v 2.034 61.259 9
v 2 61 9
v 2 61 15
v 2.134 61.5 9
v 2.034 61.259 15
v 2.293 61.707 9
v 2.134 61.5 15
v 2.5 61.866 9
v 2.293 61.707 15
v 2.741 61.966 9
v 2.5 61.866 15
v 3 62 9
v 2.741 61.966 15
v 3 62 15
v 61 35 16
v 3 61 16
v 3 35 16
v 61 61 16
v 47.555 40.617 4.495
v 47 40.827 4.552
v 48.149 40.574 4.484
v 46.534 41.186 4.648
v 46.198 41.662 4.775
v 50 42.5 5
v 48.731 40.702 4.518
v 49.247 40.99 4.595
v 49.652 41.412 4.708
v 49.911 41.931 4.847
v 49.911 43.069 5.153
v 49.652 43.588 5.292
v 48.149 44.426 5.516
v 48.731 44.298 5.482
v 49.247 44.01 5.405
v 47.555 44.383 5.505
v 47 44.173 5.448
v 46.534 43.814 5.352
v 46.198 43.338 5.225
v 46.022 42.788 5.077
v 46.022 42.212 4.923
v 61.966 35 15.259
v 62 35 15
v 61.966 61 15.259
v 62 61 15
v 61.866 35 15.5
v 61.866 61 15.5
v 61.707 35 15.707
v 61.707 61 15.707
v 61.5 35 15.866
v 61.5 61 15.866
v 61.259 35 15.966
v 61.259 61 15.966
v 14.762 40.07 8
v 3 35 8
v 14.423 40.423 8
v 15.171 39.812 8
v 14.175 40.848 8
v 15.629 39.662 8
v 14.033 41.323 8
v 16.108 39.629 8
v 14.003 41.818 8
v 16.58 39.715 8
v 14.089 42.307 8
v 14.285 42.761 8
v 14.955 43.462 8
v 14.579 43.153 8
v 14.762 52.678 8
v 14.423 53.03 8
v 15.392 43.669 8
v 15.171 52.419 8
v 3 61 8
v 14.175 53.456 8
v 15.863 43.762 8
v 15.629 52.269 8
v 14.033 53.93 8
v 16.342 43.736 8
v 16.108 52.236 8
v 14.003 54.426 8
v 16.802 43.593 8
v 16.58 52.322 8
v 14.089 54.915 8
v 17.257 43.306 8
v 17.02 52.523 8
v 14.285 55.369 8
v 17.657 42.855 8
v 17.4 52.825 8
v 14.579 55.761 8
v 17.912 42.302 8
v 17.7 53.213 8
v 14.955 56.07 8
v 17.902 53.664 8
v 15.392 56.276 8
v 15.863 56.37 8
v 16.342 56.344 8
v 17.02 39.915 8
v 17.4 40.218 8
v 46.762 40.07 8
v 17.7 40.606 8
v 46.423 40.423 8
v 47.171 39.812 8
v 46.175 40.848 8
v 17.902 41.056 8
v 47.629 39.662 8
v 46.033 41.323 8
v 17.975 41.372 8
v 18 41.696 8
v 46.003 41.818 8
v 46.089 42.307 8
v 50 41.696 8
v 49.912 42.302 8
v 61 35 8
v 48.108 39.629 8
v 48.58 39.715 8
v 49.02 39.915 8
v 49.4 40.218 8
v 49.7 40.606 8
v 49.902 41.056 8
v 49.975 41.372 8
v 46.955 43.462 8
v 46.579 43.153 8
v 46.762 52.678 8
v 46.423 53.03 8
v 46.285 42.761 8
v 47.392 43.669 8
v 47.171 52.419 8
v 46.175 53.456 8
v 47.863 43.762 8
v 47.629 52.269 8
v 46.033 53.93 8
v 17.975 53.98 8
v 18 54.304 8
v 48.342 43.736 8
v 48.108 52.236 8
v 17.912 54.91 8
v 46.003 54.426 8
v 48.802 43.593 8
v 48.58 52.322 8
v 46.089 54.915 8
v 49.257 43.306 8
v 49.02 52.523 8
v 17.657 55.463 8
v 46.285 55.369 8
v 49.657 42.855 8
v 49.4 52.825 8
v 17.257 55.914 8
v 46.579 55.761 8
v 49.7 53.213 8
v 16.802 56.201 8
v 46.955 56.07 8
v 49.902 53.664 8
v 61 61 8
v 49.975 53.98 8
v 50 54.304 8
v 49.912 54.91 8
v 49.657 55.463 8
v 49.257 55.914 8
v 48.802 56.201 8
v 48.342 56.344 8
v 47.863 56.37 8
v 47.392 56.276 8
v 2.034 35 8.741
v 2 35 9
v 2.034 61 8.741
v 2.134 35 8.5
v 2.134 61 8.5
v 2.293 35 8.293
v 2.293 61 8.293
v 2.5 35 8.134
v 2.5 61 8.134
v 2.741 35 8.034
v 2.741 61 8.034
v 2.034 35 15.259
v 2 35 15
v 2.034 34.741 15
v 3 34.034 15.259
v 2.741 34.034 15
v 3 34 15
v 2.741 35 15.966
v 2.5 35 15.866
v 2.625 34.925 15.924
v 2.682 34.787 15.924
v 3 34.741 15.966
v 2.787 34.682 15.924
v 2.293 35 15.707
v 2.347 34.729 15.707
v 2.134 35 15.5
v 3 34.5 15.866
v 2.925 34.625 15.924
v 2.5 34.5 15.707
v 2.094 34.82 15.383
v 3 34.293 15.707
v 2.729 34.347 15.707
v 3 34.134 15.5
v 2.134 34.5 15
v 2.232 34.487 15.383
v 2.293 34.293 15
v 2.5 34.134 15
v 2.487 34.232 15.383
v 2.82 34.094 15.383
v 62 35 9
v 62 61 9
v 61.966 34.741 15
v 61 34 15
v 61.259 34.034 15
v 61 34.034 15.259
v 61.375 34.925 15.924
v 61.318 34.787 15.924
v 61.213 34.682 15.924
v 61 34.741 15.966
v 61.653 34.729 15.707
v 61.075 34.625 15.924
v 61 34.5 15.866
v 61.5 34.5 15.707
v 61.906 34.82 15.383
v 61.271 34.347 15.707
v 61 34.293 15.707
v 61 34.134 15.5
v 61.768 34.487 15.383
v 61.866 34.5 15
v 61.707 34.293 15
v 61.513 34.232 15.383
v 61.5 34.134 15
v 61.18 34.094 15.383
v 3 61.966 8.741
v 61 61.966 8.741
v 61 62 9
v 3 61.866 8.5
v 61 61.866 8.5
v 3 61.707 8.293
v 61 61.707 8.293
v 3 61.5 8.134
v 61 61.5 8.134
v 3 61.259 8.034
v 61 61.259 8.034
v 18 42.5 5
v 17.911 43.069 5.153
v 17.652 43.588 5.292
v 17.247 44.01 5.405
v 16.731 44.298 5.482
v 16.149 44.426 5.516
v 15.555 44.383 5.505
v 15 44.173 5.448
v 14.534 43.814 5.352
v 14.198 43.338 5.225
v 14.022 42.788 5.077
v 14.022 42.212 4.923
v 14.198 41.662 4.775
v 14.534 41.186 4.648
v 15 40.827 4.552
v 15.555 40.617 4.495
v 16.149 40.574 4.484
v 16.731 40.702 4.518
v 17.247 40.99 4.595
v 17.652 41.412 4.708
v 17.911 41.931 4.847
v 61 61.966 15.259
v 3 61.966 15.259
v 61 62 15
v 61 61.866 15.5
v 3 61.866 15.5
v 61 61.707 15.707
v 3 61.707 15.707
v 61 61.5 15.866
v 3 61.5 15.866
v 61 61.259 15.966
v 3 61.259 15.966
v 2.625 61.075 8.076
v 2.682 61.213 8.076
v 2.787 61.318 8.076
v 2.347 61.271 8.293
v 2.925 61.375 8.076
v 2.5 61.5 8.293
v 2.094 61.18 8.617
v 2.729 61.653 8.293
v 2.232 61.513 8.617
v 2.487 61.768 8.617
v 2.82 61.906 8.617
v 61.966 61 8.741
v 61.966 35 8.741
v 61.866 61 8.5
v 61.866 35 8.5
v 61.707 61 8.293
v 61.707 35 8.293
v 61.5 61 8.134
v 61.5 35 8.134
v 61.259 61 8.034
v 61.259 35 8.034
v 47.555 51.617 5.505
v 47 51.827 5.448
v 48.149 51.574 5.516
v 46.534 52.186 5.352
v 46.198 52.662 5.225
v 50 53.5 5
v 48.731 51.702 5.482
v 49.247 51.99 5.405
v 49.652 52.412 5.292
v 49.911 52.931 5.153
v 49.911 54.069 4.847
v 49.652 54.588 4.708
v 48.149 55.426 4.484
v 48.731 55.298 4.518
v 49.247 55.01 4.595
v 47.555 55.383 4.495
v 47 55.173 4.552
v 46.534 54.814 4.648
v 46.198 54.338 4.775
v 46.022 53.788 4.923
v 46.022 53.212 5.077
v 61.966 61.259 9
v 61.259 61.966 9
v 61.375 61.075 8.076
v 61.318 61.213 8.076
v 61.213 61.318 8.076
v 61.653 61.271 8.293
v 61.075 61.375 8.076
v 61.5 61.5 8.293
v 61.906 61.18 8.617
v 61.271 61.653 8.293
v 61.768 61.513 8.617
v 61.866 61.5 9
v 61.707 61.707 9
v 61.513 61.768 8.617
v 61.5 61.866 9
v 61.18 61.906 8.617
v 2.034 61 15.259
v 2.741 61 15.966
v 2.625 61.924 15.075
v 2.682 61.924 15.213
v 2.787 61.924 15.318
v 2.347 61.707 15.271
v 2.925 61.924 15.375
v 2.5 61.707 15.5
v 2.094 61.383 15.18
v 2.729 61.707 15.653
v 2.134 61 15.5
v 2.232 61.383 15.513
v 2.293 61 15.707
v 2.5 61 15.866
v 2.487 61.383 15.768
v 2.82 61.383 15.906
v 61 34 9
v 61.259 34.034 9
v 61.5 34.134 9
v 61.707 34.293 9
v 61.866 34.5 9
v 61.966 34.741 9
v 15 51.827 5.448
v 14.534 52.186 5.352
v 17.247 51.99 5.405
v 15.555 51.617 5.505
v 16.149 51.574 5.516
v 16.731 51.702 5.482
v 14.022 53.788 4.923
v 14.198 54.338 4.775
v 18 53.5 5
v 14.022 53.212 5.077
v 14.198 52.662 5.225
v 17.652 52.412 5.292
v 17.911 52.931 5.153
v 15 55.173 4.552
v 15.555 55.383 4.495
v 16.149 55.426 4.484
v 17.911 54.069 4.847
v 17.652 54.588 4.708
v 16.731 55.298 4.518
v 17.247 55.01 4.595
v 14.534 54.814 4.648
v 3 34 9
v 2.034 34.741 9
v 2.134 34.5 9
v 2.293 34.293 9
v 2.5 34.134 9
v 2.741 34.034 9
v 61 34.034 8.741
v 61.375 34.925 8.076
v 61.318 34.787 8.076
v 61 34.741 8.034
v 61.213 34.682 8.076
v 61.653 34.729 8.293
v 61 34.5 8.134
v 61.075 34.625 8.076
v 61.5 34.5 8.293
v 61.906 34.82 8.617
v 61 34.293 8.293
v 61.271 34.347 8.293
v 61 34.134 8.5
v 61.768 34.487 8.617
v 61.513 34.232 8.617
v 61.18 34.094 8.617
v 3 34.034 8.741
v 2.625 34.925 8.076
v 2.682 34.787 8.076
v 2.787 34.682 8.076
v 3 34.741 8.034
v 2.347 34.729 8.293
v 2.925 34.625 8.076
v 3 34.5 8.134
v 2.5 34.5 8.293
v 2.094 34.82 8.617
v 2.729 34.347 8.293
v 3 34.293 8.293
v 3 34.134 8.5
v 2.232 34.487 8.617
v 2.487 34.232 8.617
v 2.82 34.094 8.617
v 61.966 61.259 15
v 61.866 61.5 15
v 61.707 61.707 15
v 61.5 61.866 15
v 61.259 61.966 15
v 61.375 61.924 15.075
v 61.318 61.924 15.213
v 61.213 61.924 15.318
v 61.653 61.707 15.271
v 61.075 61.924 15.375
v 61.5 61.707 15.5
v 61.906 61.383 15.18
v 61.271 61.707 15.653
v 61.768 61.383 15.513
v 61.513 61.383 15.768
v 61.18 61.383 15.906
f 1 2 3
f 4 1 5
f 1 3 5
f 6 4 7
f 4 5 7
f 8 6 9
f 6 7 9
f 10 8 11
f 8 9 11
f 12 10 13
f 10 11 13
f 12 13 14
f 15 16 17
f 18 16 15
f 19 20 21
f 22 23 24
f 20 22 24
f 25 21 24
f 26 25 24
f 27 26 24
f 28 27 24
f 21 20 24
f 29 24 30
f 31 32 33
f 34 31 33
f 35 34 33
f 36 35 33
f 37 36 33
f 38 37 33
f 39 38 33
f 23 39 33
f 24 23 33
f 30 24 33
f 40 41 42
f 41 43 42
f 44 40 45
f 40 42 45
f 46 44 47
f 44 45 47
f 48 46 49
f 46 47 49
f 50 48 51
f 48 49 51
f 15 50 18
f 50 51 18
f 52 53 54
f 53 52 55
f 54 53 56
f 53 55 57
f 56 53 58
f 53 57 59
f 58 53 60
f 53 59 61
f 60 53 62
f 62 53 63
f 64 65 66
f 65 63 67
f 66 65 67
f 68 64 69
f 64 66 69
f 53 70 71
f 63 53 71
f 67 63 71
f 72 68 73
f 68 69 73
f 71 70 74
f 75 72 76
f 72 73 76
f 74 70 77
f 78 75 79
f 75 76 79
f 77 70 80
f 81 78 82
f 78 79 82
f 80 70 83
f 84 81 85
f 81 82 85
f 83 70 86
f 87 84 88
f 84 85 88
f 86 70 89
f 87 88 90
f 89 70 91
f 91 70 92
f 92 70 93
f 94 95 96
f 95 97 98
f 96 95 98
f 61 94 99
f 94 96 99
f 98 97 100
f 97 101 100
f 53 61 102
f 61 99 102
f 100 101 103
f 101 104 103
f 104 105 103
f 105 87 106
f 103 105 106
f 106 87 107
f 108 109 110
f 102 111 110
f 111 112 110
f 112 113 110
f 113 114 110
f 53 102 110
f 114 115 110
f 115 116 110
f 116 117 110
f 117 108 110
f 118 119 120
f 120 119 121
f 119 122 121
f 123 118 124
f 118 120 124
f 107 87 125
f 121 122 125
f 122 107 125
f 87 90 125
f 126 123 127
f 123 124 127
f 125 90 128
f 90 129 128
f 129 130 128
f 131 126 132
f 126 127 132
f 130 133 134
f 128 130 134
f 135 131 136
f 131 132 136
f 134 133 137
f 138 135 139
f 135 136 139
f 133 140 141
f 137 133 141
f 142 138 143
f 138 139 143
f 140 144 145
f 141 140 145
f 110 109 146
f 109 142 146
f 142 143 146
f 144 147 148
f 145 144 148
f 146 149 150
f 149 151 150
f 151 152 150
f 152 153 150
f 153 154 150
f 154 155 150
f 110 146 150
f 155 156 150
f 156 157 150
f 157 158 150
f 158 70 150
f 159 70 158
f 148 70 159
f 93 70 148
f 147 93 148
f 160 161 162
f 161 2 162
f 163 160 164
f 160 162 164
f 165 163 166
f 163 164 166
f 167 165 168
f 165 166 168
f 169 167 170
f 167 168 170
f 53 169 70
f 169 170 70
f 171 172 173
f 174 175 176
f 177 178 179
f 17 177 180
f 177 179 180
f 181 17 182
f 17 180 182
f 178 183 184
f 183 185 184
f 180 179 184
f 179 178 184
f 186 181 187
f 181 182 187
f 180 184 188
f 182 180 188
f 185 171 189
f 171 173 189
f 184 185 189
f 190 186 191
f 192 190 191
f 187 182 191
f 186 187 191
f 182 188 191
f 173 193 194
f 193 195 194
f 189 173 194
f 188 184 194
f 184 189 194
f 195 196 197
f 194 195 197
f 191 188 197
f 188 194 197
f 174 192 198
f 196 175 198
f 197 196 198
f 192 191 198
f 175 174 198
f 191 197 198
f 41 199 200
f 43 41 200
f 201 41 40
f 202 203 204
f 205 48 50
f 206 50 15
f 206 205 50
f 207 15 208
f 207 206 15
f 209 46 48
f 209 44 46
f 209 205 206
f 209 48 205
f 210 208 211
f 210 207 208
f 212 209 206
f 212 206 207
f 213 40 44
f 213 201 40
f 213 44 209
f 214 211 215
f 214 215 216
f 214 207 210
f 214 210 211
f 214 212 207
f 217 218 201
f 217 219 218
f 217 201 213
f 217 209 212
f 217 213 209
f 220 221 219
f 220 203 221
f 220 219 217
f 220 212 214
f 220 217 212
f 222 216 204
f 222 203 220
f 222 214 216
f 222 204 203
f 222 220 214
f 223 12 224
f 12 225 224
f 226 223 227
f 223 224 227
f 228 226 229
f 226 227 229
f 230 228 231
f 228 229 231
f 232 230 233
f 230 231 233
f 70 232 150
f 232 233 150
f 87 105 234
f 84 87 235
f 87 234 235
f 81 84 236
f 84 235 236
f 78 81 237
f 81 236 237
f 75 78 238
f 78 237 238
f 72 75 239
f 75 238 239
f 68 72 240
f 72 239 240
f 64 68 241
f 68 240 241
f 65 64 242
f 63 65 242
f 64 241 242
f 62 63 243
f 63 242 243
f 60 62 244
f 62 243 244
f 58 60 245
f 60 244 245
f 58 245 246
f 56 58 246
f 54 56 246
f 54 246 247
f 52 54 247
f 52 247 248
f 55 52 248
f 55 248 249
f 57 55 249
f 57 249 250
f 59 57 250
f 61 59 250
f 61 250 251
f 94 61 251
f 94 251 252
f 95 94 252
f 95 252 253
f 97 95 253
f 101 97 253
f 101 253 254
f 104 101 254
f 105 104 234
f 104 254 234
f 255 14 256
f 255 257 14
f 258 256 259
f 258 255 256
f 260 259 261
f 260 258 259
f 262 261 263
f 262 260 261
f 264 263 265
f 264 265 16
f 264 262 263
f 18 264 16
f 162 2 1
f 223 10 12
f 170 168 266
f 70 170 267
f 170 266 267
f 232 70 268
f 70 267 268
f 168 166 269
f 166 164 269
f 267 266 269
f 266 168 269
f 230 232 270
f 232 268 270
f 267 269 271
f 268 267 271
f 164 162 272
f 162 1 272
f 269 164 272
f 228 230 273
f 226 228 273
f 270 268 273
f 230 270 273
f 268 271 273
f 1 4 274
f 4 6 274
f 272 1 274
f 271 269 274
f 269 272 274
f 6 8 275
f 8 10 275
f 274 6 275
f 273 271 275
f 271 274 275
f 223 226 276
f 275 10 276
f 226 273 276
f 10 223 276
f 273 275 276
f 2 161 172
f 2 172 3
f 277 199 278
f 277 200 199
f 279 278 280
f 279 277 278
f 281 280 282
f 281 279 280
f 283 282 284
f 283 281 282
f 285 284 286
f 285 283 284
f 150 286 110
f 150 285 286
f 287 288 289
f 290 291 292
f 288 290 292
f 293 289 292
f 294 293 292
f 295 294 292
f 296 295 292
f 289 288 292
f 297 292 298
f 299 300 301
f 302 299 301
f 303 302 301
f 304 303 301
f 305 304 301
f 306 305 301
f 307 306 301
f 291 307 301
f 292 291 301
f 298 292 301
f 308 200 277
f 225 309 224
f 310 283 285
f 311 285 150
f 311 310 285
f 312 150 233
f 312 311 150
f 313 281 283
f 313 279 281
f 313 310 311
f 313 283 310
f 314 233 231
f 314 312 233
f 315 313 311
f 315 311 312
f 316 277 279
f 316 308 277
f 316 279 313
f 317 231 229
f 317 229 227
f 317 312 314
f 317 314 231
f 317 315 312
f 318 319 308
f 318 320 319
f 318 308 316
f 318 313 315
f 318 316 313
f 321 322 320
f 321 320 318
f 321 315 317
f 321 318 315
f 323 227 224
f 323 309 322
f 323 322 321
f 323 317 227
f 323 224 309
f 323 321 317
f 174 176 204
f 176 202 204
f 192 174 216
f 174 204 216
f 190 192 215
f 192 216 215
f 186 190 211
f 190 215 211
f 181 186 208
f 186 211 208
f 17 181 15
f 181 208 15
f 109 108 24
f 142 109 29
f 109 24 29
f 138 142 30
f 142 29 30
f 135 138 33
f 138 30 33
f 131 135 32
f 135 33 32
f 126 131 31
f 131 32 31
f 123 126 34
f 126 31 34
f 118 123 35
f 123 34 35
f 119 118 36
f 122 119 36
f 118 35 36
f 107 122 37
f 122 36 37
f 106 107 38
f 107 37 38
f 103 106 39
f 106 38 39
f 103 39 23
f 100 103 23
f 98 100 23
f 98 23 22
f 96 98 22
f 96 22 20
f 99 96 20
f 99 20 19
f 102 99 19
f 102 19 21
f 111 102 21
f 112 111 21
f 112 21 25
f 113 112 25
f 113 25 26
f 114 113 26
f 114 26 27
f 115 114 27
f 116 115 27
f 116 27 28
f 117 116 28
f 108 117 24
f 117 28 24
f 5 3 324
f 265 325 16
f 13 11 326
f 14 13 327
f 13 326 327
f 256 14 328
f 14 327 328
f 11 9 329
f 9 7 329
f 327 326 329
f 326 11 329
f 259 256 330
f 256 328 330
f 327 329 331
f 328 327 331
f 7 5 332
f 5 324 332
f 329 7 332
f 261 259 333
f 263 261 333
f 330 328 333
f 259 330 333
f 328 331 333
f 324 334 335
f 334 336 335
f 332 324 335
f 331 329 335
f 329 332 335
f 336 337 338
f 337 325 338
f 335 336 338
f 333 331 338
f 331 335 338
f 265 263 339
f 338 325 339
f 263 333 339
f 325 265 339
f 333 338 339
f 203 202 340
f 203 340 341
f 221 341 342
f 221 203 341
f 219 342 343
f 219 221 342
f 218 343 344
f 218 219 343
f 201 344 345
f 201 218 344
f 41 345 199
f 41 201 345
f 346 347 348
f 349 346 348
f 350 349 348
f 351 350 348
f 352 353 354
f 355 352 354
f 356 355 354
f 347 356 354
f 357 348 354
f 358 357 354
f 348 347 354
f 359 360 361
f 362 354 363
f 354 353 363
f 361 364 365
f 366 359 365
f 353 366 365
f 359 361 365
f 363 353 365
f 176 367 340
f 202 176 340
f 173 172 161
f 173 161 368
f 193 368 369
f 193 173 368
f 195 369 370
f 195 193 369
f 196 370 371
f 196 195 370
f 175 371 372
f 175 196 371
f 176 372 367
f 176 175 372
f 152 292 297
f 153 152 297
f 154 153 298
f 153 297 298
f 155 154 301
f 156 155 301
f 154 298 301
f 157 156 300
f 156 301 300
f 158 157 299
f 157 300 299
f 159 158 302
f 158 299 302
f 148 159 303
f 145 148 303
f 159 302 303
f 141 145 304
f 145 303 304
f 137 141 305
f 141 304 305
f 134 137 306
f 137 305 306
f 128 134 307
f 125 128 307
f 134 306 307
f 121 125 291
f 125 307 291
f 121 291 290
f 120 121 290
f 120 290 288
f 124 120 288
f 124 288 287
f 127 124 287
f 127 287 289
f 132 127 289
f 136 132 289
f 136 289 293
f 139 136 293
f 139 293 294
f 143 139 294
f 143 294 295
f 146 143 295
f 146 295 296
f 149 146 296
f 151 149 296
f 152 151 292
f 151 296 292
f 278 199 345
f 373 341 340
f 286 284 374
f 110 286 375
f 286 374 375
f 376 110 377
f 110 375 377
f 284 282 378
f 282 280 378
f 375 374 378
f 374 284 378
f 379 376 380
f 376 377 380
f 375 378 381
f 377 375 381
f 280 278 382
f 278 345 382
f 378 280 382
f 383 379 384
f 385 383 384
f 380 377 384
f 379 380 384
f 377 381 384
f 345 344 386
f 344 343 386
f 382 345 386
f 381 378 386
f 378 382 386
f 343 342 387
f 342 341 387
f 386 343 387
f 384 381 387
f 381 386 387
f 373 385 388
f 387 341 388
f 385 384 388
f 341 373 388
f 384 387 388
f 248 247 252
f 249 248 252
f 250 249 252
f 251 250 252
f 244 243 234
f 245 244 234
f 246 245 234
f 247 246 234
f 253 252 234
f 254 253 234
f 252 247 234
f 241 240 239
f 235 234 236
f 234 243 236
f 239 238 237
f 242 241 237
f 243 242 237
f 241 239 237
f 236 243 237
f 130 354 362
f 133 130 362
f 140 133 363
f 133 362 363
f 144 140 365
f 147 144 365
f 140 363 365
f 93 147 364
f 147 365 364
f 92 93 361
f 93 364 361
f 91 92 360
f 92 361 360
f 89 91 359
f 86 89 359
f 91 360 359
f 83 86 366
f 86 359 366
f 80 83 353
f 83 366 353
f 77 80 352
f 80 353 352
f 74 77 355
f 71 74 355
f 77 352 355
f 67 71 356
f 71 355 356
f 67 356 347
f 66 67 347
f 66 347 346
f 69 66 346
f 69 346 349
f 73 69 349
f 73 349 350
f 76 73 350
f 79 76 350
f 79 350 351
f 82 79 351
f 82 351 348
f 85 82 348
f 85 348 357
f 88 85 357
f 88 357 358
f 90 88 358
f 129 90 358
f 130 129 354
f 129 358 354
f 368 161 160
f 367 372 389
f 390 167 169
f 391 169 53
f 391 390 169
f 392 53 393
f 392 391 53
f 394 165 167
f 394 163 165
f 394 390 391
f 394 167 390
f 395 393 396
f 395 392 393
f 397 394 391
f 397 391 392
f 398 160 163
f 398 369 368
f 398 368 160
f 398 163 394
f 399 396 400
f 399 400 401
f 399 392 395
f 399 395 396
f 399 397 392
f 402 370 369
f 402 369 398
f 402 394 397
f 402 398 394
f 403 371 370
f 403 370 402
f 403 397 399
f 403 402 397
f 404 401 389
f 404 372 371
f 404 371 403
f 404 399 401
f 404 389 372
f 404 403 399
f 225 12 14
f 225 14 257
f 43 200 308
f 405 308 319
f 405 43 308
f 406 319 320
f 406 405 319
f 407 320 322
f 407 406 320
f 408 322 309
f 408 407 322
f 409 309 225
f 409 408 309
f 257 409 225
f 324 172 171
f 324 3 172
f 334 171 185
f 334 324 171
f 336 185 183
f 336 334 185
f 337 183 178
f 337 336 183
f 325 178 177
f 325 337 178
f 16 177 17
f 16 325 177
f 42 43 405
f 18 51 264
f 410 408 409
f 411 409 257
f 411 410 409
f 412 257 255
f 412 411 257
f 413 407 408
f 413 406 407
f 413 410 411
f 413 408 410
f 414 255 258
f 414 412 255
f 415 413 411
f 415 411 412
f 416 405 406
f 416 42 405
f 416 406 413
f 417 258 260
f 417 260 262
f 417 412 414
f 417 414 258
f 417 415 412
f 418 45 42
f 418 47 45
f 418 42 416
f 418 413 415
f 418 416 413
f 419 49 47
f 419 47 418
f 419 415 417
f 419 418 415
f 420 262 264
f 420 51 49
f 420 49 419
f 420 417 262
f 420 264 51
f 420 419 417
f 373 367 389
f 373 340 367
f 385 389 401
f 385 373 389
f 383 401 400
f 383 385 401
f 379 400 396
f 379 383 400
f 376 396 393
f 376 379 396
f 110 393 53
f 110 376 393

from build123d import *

# Parameters (mm, degrees)
CYLINDER007_R          = 2
CYLINDER007_DEPTH      = 5
CYLINDER007_ROLL_ANGLE = 15
CYLINDER004_R          = 2
CYLINDER004_DEPTH      = 5
CYLINDER004_ROLL_ANGLE = -15
CYLINDER006_R          = 2
CYLINDER006_DEPTH      = 5
CYLINDER006_ROLL_ANGLE = -15
BOX003_W               = 60
BOX003_H               = 28
BOX003_DEPTH           = 8
FILLET002_R            = 1
CYLINDER005_R          = 2
CYLINDER005_DEPTH      = 5
CYLINDER005_ROLL_ANGLE = 15


with BuildPart() as cylinder009:
    # Cylinder007 → Cylinder007 (new body)
    with BuildSketch(Plane.XY):
        Circle(CYLINDER007_R)
    extrude(amount=CYLINDER007_DEPTH)


with BuildPart() as cylinder009_1:
    # Cylinder007 roll: moved
    add(cylinder009.part.rotate(Axis((0, 0, 0), (1, 0, 0)), CYLINDER007_ROLL_ANGLE))


with BuildPart() as cylinder009_2:
    # Cylinder007 placement: moved
    add(cylinder009_1.part.moved(Location((48, 42.5, 5))))


with BuildPart() as cylinder:
    # Cylinder004 → Cylinder004 (new body)
    with BuildSketch(Plane.XY):
        Circle(CYLINDER004_R)
    extrude(amount=CYLINDER004_DEPTH)


with BuildPart() as cylinder_1:
    # Cylinder004 roll: moved
    add(cylinder.part.rotate(Axis((0, 0, 0), (1, 0, 0)), CYLINDER004_ROLL_ANGLE))


with BuildPart() as cylinder_2:
    # Cylinder004 placement: moved
    add(cylinder_1.part.moved(Location((48, 53.5, 5))))


with BuildPart() as cylinder008:
    # Cylinder006 → Cylinder006 (new body)
    with BuildSketch(Plane.XY):
        Circle(CYLINDER006_R)
    extrude(amount=CYLINDER006_DEPTH)


with BuildPart() as cylinder008_1:
    # Cylinder006 roll: moved
    add(cylinder008.part.rotate(Axis((0, 0, 0), (1, 0, 0)), CYLINDER006_ROLL_ANGLE))


with BuildPart() as cylinder008_2:
    # Cylinder006 placement: moved
    add(cylinder008_1.part.moved(Location((16, 53.5, 5))))


with BuildPart() as basezorroredondeada:
    # Box003 → Box003 (new body)
    with BuildSketch(Plane.XY.offset(29)):
        with Locations((30, 14)):
            Rectangle(BOX003_W, BOX003_H)
    extrude(amount=BOX003_DEPTH)

    # Fillet002
    fillet002_edges = [basezorroredondeada.edges().sort_by_distance(p)[0] for p in [
        (0, 0, 33),
        (0, 14, 37),
        (0, 28, 33),
        (0, 14, 29),
        (60, 0, 33),
        (60, 14, 37),
        (60, 28, 33),
        (60, 14, 29),
        (30, 0, 29),
        (30, 0, 37),
        (30, 28, 29),
        (30, 28, 37),
    ]]
    fillet(fillet002_edges, radius=FILLET002_R)


with BuildPart() as basezorroredondeada_1:
    # Fillet002 placement: moved
    add(basezorroredondeada.part.moved(Location((2, 34, -21))))


with BuildPart() as basezorrocompleta:
    # Cylinder005 → Cylinder005 (new body)
    with BuildSketch(Plane.XY):
        Circle(CYLINDER005_R)
    extrude(amount=CYLINDER005_DEPTH)


with BuildPart() as basezorrocompleta_1:
    # Cylinder005 roll: moved
    add(basezorrocompleta.part.rotate(Axis((0, 0, 0), (1, 0, 0)), CYLINDER005_ROLL_ANGLE))


with BuildPart() as basezorrocompleta_2:
    # Cylinder005 placement: moved
    add(basezorrocompleta_1.part.moved(Location((16, 42.5, 5))))

    # Fusion003: union Cylinder009, Cylinder, Cylinder008, baseZorroRedondeada
    add(cylinder009_2.part)
    add(cylinder_2.part)
    add(cylinder008_2.part)
    add(basezorroredondeada_1.part)


solid = basezorrocompleta_2.part
